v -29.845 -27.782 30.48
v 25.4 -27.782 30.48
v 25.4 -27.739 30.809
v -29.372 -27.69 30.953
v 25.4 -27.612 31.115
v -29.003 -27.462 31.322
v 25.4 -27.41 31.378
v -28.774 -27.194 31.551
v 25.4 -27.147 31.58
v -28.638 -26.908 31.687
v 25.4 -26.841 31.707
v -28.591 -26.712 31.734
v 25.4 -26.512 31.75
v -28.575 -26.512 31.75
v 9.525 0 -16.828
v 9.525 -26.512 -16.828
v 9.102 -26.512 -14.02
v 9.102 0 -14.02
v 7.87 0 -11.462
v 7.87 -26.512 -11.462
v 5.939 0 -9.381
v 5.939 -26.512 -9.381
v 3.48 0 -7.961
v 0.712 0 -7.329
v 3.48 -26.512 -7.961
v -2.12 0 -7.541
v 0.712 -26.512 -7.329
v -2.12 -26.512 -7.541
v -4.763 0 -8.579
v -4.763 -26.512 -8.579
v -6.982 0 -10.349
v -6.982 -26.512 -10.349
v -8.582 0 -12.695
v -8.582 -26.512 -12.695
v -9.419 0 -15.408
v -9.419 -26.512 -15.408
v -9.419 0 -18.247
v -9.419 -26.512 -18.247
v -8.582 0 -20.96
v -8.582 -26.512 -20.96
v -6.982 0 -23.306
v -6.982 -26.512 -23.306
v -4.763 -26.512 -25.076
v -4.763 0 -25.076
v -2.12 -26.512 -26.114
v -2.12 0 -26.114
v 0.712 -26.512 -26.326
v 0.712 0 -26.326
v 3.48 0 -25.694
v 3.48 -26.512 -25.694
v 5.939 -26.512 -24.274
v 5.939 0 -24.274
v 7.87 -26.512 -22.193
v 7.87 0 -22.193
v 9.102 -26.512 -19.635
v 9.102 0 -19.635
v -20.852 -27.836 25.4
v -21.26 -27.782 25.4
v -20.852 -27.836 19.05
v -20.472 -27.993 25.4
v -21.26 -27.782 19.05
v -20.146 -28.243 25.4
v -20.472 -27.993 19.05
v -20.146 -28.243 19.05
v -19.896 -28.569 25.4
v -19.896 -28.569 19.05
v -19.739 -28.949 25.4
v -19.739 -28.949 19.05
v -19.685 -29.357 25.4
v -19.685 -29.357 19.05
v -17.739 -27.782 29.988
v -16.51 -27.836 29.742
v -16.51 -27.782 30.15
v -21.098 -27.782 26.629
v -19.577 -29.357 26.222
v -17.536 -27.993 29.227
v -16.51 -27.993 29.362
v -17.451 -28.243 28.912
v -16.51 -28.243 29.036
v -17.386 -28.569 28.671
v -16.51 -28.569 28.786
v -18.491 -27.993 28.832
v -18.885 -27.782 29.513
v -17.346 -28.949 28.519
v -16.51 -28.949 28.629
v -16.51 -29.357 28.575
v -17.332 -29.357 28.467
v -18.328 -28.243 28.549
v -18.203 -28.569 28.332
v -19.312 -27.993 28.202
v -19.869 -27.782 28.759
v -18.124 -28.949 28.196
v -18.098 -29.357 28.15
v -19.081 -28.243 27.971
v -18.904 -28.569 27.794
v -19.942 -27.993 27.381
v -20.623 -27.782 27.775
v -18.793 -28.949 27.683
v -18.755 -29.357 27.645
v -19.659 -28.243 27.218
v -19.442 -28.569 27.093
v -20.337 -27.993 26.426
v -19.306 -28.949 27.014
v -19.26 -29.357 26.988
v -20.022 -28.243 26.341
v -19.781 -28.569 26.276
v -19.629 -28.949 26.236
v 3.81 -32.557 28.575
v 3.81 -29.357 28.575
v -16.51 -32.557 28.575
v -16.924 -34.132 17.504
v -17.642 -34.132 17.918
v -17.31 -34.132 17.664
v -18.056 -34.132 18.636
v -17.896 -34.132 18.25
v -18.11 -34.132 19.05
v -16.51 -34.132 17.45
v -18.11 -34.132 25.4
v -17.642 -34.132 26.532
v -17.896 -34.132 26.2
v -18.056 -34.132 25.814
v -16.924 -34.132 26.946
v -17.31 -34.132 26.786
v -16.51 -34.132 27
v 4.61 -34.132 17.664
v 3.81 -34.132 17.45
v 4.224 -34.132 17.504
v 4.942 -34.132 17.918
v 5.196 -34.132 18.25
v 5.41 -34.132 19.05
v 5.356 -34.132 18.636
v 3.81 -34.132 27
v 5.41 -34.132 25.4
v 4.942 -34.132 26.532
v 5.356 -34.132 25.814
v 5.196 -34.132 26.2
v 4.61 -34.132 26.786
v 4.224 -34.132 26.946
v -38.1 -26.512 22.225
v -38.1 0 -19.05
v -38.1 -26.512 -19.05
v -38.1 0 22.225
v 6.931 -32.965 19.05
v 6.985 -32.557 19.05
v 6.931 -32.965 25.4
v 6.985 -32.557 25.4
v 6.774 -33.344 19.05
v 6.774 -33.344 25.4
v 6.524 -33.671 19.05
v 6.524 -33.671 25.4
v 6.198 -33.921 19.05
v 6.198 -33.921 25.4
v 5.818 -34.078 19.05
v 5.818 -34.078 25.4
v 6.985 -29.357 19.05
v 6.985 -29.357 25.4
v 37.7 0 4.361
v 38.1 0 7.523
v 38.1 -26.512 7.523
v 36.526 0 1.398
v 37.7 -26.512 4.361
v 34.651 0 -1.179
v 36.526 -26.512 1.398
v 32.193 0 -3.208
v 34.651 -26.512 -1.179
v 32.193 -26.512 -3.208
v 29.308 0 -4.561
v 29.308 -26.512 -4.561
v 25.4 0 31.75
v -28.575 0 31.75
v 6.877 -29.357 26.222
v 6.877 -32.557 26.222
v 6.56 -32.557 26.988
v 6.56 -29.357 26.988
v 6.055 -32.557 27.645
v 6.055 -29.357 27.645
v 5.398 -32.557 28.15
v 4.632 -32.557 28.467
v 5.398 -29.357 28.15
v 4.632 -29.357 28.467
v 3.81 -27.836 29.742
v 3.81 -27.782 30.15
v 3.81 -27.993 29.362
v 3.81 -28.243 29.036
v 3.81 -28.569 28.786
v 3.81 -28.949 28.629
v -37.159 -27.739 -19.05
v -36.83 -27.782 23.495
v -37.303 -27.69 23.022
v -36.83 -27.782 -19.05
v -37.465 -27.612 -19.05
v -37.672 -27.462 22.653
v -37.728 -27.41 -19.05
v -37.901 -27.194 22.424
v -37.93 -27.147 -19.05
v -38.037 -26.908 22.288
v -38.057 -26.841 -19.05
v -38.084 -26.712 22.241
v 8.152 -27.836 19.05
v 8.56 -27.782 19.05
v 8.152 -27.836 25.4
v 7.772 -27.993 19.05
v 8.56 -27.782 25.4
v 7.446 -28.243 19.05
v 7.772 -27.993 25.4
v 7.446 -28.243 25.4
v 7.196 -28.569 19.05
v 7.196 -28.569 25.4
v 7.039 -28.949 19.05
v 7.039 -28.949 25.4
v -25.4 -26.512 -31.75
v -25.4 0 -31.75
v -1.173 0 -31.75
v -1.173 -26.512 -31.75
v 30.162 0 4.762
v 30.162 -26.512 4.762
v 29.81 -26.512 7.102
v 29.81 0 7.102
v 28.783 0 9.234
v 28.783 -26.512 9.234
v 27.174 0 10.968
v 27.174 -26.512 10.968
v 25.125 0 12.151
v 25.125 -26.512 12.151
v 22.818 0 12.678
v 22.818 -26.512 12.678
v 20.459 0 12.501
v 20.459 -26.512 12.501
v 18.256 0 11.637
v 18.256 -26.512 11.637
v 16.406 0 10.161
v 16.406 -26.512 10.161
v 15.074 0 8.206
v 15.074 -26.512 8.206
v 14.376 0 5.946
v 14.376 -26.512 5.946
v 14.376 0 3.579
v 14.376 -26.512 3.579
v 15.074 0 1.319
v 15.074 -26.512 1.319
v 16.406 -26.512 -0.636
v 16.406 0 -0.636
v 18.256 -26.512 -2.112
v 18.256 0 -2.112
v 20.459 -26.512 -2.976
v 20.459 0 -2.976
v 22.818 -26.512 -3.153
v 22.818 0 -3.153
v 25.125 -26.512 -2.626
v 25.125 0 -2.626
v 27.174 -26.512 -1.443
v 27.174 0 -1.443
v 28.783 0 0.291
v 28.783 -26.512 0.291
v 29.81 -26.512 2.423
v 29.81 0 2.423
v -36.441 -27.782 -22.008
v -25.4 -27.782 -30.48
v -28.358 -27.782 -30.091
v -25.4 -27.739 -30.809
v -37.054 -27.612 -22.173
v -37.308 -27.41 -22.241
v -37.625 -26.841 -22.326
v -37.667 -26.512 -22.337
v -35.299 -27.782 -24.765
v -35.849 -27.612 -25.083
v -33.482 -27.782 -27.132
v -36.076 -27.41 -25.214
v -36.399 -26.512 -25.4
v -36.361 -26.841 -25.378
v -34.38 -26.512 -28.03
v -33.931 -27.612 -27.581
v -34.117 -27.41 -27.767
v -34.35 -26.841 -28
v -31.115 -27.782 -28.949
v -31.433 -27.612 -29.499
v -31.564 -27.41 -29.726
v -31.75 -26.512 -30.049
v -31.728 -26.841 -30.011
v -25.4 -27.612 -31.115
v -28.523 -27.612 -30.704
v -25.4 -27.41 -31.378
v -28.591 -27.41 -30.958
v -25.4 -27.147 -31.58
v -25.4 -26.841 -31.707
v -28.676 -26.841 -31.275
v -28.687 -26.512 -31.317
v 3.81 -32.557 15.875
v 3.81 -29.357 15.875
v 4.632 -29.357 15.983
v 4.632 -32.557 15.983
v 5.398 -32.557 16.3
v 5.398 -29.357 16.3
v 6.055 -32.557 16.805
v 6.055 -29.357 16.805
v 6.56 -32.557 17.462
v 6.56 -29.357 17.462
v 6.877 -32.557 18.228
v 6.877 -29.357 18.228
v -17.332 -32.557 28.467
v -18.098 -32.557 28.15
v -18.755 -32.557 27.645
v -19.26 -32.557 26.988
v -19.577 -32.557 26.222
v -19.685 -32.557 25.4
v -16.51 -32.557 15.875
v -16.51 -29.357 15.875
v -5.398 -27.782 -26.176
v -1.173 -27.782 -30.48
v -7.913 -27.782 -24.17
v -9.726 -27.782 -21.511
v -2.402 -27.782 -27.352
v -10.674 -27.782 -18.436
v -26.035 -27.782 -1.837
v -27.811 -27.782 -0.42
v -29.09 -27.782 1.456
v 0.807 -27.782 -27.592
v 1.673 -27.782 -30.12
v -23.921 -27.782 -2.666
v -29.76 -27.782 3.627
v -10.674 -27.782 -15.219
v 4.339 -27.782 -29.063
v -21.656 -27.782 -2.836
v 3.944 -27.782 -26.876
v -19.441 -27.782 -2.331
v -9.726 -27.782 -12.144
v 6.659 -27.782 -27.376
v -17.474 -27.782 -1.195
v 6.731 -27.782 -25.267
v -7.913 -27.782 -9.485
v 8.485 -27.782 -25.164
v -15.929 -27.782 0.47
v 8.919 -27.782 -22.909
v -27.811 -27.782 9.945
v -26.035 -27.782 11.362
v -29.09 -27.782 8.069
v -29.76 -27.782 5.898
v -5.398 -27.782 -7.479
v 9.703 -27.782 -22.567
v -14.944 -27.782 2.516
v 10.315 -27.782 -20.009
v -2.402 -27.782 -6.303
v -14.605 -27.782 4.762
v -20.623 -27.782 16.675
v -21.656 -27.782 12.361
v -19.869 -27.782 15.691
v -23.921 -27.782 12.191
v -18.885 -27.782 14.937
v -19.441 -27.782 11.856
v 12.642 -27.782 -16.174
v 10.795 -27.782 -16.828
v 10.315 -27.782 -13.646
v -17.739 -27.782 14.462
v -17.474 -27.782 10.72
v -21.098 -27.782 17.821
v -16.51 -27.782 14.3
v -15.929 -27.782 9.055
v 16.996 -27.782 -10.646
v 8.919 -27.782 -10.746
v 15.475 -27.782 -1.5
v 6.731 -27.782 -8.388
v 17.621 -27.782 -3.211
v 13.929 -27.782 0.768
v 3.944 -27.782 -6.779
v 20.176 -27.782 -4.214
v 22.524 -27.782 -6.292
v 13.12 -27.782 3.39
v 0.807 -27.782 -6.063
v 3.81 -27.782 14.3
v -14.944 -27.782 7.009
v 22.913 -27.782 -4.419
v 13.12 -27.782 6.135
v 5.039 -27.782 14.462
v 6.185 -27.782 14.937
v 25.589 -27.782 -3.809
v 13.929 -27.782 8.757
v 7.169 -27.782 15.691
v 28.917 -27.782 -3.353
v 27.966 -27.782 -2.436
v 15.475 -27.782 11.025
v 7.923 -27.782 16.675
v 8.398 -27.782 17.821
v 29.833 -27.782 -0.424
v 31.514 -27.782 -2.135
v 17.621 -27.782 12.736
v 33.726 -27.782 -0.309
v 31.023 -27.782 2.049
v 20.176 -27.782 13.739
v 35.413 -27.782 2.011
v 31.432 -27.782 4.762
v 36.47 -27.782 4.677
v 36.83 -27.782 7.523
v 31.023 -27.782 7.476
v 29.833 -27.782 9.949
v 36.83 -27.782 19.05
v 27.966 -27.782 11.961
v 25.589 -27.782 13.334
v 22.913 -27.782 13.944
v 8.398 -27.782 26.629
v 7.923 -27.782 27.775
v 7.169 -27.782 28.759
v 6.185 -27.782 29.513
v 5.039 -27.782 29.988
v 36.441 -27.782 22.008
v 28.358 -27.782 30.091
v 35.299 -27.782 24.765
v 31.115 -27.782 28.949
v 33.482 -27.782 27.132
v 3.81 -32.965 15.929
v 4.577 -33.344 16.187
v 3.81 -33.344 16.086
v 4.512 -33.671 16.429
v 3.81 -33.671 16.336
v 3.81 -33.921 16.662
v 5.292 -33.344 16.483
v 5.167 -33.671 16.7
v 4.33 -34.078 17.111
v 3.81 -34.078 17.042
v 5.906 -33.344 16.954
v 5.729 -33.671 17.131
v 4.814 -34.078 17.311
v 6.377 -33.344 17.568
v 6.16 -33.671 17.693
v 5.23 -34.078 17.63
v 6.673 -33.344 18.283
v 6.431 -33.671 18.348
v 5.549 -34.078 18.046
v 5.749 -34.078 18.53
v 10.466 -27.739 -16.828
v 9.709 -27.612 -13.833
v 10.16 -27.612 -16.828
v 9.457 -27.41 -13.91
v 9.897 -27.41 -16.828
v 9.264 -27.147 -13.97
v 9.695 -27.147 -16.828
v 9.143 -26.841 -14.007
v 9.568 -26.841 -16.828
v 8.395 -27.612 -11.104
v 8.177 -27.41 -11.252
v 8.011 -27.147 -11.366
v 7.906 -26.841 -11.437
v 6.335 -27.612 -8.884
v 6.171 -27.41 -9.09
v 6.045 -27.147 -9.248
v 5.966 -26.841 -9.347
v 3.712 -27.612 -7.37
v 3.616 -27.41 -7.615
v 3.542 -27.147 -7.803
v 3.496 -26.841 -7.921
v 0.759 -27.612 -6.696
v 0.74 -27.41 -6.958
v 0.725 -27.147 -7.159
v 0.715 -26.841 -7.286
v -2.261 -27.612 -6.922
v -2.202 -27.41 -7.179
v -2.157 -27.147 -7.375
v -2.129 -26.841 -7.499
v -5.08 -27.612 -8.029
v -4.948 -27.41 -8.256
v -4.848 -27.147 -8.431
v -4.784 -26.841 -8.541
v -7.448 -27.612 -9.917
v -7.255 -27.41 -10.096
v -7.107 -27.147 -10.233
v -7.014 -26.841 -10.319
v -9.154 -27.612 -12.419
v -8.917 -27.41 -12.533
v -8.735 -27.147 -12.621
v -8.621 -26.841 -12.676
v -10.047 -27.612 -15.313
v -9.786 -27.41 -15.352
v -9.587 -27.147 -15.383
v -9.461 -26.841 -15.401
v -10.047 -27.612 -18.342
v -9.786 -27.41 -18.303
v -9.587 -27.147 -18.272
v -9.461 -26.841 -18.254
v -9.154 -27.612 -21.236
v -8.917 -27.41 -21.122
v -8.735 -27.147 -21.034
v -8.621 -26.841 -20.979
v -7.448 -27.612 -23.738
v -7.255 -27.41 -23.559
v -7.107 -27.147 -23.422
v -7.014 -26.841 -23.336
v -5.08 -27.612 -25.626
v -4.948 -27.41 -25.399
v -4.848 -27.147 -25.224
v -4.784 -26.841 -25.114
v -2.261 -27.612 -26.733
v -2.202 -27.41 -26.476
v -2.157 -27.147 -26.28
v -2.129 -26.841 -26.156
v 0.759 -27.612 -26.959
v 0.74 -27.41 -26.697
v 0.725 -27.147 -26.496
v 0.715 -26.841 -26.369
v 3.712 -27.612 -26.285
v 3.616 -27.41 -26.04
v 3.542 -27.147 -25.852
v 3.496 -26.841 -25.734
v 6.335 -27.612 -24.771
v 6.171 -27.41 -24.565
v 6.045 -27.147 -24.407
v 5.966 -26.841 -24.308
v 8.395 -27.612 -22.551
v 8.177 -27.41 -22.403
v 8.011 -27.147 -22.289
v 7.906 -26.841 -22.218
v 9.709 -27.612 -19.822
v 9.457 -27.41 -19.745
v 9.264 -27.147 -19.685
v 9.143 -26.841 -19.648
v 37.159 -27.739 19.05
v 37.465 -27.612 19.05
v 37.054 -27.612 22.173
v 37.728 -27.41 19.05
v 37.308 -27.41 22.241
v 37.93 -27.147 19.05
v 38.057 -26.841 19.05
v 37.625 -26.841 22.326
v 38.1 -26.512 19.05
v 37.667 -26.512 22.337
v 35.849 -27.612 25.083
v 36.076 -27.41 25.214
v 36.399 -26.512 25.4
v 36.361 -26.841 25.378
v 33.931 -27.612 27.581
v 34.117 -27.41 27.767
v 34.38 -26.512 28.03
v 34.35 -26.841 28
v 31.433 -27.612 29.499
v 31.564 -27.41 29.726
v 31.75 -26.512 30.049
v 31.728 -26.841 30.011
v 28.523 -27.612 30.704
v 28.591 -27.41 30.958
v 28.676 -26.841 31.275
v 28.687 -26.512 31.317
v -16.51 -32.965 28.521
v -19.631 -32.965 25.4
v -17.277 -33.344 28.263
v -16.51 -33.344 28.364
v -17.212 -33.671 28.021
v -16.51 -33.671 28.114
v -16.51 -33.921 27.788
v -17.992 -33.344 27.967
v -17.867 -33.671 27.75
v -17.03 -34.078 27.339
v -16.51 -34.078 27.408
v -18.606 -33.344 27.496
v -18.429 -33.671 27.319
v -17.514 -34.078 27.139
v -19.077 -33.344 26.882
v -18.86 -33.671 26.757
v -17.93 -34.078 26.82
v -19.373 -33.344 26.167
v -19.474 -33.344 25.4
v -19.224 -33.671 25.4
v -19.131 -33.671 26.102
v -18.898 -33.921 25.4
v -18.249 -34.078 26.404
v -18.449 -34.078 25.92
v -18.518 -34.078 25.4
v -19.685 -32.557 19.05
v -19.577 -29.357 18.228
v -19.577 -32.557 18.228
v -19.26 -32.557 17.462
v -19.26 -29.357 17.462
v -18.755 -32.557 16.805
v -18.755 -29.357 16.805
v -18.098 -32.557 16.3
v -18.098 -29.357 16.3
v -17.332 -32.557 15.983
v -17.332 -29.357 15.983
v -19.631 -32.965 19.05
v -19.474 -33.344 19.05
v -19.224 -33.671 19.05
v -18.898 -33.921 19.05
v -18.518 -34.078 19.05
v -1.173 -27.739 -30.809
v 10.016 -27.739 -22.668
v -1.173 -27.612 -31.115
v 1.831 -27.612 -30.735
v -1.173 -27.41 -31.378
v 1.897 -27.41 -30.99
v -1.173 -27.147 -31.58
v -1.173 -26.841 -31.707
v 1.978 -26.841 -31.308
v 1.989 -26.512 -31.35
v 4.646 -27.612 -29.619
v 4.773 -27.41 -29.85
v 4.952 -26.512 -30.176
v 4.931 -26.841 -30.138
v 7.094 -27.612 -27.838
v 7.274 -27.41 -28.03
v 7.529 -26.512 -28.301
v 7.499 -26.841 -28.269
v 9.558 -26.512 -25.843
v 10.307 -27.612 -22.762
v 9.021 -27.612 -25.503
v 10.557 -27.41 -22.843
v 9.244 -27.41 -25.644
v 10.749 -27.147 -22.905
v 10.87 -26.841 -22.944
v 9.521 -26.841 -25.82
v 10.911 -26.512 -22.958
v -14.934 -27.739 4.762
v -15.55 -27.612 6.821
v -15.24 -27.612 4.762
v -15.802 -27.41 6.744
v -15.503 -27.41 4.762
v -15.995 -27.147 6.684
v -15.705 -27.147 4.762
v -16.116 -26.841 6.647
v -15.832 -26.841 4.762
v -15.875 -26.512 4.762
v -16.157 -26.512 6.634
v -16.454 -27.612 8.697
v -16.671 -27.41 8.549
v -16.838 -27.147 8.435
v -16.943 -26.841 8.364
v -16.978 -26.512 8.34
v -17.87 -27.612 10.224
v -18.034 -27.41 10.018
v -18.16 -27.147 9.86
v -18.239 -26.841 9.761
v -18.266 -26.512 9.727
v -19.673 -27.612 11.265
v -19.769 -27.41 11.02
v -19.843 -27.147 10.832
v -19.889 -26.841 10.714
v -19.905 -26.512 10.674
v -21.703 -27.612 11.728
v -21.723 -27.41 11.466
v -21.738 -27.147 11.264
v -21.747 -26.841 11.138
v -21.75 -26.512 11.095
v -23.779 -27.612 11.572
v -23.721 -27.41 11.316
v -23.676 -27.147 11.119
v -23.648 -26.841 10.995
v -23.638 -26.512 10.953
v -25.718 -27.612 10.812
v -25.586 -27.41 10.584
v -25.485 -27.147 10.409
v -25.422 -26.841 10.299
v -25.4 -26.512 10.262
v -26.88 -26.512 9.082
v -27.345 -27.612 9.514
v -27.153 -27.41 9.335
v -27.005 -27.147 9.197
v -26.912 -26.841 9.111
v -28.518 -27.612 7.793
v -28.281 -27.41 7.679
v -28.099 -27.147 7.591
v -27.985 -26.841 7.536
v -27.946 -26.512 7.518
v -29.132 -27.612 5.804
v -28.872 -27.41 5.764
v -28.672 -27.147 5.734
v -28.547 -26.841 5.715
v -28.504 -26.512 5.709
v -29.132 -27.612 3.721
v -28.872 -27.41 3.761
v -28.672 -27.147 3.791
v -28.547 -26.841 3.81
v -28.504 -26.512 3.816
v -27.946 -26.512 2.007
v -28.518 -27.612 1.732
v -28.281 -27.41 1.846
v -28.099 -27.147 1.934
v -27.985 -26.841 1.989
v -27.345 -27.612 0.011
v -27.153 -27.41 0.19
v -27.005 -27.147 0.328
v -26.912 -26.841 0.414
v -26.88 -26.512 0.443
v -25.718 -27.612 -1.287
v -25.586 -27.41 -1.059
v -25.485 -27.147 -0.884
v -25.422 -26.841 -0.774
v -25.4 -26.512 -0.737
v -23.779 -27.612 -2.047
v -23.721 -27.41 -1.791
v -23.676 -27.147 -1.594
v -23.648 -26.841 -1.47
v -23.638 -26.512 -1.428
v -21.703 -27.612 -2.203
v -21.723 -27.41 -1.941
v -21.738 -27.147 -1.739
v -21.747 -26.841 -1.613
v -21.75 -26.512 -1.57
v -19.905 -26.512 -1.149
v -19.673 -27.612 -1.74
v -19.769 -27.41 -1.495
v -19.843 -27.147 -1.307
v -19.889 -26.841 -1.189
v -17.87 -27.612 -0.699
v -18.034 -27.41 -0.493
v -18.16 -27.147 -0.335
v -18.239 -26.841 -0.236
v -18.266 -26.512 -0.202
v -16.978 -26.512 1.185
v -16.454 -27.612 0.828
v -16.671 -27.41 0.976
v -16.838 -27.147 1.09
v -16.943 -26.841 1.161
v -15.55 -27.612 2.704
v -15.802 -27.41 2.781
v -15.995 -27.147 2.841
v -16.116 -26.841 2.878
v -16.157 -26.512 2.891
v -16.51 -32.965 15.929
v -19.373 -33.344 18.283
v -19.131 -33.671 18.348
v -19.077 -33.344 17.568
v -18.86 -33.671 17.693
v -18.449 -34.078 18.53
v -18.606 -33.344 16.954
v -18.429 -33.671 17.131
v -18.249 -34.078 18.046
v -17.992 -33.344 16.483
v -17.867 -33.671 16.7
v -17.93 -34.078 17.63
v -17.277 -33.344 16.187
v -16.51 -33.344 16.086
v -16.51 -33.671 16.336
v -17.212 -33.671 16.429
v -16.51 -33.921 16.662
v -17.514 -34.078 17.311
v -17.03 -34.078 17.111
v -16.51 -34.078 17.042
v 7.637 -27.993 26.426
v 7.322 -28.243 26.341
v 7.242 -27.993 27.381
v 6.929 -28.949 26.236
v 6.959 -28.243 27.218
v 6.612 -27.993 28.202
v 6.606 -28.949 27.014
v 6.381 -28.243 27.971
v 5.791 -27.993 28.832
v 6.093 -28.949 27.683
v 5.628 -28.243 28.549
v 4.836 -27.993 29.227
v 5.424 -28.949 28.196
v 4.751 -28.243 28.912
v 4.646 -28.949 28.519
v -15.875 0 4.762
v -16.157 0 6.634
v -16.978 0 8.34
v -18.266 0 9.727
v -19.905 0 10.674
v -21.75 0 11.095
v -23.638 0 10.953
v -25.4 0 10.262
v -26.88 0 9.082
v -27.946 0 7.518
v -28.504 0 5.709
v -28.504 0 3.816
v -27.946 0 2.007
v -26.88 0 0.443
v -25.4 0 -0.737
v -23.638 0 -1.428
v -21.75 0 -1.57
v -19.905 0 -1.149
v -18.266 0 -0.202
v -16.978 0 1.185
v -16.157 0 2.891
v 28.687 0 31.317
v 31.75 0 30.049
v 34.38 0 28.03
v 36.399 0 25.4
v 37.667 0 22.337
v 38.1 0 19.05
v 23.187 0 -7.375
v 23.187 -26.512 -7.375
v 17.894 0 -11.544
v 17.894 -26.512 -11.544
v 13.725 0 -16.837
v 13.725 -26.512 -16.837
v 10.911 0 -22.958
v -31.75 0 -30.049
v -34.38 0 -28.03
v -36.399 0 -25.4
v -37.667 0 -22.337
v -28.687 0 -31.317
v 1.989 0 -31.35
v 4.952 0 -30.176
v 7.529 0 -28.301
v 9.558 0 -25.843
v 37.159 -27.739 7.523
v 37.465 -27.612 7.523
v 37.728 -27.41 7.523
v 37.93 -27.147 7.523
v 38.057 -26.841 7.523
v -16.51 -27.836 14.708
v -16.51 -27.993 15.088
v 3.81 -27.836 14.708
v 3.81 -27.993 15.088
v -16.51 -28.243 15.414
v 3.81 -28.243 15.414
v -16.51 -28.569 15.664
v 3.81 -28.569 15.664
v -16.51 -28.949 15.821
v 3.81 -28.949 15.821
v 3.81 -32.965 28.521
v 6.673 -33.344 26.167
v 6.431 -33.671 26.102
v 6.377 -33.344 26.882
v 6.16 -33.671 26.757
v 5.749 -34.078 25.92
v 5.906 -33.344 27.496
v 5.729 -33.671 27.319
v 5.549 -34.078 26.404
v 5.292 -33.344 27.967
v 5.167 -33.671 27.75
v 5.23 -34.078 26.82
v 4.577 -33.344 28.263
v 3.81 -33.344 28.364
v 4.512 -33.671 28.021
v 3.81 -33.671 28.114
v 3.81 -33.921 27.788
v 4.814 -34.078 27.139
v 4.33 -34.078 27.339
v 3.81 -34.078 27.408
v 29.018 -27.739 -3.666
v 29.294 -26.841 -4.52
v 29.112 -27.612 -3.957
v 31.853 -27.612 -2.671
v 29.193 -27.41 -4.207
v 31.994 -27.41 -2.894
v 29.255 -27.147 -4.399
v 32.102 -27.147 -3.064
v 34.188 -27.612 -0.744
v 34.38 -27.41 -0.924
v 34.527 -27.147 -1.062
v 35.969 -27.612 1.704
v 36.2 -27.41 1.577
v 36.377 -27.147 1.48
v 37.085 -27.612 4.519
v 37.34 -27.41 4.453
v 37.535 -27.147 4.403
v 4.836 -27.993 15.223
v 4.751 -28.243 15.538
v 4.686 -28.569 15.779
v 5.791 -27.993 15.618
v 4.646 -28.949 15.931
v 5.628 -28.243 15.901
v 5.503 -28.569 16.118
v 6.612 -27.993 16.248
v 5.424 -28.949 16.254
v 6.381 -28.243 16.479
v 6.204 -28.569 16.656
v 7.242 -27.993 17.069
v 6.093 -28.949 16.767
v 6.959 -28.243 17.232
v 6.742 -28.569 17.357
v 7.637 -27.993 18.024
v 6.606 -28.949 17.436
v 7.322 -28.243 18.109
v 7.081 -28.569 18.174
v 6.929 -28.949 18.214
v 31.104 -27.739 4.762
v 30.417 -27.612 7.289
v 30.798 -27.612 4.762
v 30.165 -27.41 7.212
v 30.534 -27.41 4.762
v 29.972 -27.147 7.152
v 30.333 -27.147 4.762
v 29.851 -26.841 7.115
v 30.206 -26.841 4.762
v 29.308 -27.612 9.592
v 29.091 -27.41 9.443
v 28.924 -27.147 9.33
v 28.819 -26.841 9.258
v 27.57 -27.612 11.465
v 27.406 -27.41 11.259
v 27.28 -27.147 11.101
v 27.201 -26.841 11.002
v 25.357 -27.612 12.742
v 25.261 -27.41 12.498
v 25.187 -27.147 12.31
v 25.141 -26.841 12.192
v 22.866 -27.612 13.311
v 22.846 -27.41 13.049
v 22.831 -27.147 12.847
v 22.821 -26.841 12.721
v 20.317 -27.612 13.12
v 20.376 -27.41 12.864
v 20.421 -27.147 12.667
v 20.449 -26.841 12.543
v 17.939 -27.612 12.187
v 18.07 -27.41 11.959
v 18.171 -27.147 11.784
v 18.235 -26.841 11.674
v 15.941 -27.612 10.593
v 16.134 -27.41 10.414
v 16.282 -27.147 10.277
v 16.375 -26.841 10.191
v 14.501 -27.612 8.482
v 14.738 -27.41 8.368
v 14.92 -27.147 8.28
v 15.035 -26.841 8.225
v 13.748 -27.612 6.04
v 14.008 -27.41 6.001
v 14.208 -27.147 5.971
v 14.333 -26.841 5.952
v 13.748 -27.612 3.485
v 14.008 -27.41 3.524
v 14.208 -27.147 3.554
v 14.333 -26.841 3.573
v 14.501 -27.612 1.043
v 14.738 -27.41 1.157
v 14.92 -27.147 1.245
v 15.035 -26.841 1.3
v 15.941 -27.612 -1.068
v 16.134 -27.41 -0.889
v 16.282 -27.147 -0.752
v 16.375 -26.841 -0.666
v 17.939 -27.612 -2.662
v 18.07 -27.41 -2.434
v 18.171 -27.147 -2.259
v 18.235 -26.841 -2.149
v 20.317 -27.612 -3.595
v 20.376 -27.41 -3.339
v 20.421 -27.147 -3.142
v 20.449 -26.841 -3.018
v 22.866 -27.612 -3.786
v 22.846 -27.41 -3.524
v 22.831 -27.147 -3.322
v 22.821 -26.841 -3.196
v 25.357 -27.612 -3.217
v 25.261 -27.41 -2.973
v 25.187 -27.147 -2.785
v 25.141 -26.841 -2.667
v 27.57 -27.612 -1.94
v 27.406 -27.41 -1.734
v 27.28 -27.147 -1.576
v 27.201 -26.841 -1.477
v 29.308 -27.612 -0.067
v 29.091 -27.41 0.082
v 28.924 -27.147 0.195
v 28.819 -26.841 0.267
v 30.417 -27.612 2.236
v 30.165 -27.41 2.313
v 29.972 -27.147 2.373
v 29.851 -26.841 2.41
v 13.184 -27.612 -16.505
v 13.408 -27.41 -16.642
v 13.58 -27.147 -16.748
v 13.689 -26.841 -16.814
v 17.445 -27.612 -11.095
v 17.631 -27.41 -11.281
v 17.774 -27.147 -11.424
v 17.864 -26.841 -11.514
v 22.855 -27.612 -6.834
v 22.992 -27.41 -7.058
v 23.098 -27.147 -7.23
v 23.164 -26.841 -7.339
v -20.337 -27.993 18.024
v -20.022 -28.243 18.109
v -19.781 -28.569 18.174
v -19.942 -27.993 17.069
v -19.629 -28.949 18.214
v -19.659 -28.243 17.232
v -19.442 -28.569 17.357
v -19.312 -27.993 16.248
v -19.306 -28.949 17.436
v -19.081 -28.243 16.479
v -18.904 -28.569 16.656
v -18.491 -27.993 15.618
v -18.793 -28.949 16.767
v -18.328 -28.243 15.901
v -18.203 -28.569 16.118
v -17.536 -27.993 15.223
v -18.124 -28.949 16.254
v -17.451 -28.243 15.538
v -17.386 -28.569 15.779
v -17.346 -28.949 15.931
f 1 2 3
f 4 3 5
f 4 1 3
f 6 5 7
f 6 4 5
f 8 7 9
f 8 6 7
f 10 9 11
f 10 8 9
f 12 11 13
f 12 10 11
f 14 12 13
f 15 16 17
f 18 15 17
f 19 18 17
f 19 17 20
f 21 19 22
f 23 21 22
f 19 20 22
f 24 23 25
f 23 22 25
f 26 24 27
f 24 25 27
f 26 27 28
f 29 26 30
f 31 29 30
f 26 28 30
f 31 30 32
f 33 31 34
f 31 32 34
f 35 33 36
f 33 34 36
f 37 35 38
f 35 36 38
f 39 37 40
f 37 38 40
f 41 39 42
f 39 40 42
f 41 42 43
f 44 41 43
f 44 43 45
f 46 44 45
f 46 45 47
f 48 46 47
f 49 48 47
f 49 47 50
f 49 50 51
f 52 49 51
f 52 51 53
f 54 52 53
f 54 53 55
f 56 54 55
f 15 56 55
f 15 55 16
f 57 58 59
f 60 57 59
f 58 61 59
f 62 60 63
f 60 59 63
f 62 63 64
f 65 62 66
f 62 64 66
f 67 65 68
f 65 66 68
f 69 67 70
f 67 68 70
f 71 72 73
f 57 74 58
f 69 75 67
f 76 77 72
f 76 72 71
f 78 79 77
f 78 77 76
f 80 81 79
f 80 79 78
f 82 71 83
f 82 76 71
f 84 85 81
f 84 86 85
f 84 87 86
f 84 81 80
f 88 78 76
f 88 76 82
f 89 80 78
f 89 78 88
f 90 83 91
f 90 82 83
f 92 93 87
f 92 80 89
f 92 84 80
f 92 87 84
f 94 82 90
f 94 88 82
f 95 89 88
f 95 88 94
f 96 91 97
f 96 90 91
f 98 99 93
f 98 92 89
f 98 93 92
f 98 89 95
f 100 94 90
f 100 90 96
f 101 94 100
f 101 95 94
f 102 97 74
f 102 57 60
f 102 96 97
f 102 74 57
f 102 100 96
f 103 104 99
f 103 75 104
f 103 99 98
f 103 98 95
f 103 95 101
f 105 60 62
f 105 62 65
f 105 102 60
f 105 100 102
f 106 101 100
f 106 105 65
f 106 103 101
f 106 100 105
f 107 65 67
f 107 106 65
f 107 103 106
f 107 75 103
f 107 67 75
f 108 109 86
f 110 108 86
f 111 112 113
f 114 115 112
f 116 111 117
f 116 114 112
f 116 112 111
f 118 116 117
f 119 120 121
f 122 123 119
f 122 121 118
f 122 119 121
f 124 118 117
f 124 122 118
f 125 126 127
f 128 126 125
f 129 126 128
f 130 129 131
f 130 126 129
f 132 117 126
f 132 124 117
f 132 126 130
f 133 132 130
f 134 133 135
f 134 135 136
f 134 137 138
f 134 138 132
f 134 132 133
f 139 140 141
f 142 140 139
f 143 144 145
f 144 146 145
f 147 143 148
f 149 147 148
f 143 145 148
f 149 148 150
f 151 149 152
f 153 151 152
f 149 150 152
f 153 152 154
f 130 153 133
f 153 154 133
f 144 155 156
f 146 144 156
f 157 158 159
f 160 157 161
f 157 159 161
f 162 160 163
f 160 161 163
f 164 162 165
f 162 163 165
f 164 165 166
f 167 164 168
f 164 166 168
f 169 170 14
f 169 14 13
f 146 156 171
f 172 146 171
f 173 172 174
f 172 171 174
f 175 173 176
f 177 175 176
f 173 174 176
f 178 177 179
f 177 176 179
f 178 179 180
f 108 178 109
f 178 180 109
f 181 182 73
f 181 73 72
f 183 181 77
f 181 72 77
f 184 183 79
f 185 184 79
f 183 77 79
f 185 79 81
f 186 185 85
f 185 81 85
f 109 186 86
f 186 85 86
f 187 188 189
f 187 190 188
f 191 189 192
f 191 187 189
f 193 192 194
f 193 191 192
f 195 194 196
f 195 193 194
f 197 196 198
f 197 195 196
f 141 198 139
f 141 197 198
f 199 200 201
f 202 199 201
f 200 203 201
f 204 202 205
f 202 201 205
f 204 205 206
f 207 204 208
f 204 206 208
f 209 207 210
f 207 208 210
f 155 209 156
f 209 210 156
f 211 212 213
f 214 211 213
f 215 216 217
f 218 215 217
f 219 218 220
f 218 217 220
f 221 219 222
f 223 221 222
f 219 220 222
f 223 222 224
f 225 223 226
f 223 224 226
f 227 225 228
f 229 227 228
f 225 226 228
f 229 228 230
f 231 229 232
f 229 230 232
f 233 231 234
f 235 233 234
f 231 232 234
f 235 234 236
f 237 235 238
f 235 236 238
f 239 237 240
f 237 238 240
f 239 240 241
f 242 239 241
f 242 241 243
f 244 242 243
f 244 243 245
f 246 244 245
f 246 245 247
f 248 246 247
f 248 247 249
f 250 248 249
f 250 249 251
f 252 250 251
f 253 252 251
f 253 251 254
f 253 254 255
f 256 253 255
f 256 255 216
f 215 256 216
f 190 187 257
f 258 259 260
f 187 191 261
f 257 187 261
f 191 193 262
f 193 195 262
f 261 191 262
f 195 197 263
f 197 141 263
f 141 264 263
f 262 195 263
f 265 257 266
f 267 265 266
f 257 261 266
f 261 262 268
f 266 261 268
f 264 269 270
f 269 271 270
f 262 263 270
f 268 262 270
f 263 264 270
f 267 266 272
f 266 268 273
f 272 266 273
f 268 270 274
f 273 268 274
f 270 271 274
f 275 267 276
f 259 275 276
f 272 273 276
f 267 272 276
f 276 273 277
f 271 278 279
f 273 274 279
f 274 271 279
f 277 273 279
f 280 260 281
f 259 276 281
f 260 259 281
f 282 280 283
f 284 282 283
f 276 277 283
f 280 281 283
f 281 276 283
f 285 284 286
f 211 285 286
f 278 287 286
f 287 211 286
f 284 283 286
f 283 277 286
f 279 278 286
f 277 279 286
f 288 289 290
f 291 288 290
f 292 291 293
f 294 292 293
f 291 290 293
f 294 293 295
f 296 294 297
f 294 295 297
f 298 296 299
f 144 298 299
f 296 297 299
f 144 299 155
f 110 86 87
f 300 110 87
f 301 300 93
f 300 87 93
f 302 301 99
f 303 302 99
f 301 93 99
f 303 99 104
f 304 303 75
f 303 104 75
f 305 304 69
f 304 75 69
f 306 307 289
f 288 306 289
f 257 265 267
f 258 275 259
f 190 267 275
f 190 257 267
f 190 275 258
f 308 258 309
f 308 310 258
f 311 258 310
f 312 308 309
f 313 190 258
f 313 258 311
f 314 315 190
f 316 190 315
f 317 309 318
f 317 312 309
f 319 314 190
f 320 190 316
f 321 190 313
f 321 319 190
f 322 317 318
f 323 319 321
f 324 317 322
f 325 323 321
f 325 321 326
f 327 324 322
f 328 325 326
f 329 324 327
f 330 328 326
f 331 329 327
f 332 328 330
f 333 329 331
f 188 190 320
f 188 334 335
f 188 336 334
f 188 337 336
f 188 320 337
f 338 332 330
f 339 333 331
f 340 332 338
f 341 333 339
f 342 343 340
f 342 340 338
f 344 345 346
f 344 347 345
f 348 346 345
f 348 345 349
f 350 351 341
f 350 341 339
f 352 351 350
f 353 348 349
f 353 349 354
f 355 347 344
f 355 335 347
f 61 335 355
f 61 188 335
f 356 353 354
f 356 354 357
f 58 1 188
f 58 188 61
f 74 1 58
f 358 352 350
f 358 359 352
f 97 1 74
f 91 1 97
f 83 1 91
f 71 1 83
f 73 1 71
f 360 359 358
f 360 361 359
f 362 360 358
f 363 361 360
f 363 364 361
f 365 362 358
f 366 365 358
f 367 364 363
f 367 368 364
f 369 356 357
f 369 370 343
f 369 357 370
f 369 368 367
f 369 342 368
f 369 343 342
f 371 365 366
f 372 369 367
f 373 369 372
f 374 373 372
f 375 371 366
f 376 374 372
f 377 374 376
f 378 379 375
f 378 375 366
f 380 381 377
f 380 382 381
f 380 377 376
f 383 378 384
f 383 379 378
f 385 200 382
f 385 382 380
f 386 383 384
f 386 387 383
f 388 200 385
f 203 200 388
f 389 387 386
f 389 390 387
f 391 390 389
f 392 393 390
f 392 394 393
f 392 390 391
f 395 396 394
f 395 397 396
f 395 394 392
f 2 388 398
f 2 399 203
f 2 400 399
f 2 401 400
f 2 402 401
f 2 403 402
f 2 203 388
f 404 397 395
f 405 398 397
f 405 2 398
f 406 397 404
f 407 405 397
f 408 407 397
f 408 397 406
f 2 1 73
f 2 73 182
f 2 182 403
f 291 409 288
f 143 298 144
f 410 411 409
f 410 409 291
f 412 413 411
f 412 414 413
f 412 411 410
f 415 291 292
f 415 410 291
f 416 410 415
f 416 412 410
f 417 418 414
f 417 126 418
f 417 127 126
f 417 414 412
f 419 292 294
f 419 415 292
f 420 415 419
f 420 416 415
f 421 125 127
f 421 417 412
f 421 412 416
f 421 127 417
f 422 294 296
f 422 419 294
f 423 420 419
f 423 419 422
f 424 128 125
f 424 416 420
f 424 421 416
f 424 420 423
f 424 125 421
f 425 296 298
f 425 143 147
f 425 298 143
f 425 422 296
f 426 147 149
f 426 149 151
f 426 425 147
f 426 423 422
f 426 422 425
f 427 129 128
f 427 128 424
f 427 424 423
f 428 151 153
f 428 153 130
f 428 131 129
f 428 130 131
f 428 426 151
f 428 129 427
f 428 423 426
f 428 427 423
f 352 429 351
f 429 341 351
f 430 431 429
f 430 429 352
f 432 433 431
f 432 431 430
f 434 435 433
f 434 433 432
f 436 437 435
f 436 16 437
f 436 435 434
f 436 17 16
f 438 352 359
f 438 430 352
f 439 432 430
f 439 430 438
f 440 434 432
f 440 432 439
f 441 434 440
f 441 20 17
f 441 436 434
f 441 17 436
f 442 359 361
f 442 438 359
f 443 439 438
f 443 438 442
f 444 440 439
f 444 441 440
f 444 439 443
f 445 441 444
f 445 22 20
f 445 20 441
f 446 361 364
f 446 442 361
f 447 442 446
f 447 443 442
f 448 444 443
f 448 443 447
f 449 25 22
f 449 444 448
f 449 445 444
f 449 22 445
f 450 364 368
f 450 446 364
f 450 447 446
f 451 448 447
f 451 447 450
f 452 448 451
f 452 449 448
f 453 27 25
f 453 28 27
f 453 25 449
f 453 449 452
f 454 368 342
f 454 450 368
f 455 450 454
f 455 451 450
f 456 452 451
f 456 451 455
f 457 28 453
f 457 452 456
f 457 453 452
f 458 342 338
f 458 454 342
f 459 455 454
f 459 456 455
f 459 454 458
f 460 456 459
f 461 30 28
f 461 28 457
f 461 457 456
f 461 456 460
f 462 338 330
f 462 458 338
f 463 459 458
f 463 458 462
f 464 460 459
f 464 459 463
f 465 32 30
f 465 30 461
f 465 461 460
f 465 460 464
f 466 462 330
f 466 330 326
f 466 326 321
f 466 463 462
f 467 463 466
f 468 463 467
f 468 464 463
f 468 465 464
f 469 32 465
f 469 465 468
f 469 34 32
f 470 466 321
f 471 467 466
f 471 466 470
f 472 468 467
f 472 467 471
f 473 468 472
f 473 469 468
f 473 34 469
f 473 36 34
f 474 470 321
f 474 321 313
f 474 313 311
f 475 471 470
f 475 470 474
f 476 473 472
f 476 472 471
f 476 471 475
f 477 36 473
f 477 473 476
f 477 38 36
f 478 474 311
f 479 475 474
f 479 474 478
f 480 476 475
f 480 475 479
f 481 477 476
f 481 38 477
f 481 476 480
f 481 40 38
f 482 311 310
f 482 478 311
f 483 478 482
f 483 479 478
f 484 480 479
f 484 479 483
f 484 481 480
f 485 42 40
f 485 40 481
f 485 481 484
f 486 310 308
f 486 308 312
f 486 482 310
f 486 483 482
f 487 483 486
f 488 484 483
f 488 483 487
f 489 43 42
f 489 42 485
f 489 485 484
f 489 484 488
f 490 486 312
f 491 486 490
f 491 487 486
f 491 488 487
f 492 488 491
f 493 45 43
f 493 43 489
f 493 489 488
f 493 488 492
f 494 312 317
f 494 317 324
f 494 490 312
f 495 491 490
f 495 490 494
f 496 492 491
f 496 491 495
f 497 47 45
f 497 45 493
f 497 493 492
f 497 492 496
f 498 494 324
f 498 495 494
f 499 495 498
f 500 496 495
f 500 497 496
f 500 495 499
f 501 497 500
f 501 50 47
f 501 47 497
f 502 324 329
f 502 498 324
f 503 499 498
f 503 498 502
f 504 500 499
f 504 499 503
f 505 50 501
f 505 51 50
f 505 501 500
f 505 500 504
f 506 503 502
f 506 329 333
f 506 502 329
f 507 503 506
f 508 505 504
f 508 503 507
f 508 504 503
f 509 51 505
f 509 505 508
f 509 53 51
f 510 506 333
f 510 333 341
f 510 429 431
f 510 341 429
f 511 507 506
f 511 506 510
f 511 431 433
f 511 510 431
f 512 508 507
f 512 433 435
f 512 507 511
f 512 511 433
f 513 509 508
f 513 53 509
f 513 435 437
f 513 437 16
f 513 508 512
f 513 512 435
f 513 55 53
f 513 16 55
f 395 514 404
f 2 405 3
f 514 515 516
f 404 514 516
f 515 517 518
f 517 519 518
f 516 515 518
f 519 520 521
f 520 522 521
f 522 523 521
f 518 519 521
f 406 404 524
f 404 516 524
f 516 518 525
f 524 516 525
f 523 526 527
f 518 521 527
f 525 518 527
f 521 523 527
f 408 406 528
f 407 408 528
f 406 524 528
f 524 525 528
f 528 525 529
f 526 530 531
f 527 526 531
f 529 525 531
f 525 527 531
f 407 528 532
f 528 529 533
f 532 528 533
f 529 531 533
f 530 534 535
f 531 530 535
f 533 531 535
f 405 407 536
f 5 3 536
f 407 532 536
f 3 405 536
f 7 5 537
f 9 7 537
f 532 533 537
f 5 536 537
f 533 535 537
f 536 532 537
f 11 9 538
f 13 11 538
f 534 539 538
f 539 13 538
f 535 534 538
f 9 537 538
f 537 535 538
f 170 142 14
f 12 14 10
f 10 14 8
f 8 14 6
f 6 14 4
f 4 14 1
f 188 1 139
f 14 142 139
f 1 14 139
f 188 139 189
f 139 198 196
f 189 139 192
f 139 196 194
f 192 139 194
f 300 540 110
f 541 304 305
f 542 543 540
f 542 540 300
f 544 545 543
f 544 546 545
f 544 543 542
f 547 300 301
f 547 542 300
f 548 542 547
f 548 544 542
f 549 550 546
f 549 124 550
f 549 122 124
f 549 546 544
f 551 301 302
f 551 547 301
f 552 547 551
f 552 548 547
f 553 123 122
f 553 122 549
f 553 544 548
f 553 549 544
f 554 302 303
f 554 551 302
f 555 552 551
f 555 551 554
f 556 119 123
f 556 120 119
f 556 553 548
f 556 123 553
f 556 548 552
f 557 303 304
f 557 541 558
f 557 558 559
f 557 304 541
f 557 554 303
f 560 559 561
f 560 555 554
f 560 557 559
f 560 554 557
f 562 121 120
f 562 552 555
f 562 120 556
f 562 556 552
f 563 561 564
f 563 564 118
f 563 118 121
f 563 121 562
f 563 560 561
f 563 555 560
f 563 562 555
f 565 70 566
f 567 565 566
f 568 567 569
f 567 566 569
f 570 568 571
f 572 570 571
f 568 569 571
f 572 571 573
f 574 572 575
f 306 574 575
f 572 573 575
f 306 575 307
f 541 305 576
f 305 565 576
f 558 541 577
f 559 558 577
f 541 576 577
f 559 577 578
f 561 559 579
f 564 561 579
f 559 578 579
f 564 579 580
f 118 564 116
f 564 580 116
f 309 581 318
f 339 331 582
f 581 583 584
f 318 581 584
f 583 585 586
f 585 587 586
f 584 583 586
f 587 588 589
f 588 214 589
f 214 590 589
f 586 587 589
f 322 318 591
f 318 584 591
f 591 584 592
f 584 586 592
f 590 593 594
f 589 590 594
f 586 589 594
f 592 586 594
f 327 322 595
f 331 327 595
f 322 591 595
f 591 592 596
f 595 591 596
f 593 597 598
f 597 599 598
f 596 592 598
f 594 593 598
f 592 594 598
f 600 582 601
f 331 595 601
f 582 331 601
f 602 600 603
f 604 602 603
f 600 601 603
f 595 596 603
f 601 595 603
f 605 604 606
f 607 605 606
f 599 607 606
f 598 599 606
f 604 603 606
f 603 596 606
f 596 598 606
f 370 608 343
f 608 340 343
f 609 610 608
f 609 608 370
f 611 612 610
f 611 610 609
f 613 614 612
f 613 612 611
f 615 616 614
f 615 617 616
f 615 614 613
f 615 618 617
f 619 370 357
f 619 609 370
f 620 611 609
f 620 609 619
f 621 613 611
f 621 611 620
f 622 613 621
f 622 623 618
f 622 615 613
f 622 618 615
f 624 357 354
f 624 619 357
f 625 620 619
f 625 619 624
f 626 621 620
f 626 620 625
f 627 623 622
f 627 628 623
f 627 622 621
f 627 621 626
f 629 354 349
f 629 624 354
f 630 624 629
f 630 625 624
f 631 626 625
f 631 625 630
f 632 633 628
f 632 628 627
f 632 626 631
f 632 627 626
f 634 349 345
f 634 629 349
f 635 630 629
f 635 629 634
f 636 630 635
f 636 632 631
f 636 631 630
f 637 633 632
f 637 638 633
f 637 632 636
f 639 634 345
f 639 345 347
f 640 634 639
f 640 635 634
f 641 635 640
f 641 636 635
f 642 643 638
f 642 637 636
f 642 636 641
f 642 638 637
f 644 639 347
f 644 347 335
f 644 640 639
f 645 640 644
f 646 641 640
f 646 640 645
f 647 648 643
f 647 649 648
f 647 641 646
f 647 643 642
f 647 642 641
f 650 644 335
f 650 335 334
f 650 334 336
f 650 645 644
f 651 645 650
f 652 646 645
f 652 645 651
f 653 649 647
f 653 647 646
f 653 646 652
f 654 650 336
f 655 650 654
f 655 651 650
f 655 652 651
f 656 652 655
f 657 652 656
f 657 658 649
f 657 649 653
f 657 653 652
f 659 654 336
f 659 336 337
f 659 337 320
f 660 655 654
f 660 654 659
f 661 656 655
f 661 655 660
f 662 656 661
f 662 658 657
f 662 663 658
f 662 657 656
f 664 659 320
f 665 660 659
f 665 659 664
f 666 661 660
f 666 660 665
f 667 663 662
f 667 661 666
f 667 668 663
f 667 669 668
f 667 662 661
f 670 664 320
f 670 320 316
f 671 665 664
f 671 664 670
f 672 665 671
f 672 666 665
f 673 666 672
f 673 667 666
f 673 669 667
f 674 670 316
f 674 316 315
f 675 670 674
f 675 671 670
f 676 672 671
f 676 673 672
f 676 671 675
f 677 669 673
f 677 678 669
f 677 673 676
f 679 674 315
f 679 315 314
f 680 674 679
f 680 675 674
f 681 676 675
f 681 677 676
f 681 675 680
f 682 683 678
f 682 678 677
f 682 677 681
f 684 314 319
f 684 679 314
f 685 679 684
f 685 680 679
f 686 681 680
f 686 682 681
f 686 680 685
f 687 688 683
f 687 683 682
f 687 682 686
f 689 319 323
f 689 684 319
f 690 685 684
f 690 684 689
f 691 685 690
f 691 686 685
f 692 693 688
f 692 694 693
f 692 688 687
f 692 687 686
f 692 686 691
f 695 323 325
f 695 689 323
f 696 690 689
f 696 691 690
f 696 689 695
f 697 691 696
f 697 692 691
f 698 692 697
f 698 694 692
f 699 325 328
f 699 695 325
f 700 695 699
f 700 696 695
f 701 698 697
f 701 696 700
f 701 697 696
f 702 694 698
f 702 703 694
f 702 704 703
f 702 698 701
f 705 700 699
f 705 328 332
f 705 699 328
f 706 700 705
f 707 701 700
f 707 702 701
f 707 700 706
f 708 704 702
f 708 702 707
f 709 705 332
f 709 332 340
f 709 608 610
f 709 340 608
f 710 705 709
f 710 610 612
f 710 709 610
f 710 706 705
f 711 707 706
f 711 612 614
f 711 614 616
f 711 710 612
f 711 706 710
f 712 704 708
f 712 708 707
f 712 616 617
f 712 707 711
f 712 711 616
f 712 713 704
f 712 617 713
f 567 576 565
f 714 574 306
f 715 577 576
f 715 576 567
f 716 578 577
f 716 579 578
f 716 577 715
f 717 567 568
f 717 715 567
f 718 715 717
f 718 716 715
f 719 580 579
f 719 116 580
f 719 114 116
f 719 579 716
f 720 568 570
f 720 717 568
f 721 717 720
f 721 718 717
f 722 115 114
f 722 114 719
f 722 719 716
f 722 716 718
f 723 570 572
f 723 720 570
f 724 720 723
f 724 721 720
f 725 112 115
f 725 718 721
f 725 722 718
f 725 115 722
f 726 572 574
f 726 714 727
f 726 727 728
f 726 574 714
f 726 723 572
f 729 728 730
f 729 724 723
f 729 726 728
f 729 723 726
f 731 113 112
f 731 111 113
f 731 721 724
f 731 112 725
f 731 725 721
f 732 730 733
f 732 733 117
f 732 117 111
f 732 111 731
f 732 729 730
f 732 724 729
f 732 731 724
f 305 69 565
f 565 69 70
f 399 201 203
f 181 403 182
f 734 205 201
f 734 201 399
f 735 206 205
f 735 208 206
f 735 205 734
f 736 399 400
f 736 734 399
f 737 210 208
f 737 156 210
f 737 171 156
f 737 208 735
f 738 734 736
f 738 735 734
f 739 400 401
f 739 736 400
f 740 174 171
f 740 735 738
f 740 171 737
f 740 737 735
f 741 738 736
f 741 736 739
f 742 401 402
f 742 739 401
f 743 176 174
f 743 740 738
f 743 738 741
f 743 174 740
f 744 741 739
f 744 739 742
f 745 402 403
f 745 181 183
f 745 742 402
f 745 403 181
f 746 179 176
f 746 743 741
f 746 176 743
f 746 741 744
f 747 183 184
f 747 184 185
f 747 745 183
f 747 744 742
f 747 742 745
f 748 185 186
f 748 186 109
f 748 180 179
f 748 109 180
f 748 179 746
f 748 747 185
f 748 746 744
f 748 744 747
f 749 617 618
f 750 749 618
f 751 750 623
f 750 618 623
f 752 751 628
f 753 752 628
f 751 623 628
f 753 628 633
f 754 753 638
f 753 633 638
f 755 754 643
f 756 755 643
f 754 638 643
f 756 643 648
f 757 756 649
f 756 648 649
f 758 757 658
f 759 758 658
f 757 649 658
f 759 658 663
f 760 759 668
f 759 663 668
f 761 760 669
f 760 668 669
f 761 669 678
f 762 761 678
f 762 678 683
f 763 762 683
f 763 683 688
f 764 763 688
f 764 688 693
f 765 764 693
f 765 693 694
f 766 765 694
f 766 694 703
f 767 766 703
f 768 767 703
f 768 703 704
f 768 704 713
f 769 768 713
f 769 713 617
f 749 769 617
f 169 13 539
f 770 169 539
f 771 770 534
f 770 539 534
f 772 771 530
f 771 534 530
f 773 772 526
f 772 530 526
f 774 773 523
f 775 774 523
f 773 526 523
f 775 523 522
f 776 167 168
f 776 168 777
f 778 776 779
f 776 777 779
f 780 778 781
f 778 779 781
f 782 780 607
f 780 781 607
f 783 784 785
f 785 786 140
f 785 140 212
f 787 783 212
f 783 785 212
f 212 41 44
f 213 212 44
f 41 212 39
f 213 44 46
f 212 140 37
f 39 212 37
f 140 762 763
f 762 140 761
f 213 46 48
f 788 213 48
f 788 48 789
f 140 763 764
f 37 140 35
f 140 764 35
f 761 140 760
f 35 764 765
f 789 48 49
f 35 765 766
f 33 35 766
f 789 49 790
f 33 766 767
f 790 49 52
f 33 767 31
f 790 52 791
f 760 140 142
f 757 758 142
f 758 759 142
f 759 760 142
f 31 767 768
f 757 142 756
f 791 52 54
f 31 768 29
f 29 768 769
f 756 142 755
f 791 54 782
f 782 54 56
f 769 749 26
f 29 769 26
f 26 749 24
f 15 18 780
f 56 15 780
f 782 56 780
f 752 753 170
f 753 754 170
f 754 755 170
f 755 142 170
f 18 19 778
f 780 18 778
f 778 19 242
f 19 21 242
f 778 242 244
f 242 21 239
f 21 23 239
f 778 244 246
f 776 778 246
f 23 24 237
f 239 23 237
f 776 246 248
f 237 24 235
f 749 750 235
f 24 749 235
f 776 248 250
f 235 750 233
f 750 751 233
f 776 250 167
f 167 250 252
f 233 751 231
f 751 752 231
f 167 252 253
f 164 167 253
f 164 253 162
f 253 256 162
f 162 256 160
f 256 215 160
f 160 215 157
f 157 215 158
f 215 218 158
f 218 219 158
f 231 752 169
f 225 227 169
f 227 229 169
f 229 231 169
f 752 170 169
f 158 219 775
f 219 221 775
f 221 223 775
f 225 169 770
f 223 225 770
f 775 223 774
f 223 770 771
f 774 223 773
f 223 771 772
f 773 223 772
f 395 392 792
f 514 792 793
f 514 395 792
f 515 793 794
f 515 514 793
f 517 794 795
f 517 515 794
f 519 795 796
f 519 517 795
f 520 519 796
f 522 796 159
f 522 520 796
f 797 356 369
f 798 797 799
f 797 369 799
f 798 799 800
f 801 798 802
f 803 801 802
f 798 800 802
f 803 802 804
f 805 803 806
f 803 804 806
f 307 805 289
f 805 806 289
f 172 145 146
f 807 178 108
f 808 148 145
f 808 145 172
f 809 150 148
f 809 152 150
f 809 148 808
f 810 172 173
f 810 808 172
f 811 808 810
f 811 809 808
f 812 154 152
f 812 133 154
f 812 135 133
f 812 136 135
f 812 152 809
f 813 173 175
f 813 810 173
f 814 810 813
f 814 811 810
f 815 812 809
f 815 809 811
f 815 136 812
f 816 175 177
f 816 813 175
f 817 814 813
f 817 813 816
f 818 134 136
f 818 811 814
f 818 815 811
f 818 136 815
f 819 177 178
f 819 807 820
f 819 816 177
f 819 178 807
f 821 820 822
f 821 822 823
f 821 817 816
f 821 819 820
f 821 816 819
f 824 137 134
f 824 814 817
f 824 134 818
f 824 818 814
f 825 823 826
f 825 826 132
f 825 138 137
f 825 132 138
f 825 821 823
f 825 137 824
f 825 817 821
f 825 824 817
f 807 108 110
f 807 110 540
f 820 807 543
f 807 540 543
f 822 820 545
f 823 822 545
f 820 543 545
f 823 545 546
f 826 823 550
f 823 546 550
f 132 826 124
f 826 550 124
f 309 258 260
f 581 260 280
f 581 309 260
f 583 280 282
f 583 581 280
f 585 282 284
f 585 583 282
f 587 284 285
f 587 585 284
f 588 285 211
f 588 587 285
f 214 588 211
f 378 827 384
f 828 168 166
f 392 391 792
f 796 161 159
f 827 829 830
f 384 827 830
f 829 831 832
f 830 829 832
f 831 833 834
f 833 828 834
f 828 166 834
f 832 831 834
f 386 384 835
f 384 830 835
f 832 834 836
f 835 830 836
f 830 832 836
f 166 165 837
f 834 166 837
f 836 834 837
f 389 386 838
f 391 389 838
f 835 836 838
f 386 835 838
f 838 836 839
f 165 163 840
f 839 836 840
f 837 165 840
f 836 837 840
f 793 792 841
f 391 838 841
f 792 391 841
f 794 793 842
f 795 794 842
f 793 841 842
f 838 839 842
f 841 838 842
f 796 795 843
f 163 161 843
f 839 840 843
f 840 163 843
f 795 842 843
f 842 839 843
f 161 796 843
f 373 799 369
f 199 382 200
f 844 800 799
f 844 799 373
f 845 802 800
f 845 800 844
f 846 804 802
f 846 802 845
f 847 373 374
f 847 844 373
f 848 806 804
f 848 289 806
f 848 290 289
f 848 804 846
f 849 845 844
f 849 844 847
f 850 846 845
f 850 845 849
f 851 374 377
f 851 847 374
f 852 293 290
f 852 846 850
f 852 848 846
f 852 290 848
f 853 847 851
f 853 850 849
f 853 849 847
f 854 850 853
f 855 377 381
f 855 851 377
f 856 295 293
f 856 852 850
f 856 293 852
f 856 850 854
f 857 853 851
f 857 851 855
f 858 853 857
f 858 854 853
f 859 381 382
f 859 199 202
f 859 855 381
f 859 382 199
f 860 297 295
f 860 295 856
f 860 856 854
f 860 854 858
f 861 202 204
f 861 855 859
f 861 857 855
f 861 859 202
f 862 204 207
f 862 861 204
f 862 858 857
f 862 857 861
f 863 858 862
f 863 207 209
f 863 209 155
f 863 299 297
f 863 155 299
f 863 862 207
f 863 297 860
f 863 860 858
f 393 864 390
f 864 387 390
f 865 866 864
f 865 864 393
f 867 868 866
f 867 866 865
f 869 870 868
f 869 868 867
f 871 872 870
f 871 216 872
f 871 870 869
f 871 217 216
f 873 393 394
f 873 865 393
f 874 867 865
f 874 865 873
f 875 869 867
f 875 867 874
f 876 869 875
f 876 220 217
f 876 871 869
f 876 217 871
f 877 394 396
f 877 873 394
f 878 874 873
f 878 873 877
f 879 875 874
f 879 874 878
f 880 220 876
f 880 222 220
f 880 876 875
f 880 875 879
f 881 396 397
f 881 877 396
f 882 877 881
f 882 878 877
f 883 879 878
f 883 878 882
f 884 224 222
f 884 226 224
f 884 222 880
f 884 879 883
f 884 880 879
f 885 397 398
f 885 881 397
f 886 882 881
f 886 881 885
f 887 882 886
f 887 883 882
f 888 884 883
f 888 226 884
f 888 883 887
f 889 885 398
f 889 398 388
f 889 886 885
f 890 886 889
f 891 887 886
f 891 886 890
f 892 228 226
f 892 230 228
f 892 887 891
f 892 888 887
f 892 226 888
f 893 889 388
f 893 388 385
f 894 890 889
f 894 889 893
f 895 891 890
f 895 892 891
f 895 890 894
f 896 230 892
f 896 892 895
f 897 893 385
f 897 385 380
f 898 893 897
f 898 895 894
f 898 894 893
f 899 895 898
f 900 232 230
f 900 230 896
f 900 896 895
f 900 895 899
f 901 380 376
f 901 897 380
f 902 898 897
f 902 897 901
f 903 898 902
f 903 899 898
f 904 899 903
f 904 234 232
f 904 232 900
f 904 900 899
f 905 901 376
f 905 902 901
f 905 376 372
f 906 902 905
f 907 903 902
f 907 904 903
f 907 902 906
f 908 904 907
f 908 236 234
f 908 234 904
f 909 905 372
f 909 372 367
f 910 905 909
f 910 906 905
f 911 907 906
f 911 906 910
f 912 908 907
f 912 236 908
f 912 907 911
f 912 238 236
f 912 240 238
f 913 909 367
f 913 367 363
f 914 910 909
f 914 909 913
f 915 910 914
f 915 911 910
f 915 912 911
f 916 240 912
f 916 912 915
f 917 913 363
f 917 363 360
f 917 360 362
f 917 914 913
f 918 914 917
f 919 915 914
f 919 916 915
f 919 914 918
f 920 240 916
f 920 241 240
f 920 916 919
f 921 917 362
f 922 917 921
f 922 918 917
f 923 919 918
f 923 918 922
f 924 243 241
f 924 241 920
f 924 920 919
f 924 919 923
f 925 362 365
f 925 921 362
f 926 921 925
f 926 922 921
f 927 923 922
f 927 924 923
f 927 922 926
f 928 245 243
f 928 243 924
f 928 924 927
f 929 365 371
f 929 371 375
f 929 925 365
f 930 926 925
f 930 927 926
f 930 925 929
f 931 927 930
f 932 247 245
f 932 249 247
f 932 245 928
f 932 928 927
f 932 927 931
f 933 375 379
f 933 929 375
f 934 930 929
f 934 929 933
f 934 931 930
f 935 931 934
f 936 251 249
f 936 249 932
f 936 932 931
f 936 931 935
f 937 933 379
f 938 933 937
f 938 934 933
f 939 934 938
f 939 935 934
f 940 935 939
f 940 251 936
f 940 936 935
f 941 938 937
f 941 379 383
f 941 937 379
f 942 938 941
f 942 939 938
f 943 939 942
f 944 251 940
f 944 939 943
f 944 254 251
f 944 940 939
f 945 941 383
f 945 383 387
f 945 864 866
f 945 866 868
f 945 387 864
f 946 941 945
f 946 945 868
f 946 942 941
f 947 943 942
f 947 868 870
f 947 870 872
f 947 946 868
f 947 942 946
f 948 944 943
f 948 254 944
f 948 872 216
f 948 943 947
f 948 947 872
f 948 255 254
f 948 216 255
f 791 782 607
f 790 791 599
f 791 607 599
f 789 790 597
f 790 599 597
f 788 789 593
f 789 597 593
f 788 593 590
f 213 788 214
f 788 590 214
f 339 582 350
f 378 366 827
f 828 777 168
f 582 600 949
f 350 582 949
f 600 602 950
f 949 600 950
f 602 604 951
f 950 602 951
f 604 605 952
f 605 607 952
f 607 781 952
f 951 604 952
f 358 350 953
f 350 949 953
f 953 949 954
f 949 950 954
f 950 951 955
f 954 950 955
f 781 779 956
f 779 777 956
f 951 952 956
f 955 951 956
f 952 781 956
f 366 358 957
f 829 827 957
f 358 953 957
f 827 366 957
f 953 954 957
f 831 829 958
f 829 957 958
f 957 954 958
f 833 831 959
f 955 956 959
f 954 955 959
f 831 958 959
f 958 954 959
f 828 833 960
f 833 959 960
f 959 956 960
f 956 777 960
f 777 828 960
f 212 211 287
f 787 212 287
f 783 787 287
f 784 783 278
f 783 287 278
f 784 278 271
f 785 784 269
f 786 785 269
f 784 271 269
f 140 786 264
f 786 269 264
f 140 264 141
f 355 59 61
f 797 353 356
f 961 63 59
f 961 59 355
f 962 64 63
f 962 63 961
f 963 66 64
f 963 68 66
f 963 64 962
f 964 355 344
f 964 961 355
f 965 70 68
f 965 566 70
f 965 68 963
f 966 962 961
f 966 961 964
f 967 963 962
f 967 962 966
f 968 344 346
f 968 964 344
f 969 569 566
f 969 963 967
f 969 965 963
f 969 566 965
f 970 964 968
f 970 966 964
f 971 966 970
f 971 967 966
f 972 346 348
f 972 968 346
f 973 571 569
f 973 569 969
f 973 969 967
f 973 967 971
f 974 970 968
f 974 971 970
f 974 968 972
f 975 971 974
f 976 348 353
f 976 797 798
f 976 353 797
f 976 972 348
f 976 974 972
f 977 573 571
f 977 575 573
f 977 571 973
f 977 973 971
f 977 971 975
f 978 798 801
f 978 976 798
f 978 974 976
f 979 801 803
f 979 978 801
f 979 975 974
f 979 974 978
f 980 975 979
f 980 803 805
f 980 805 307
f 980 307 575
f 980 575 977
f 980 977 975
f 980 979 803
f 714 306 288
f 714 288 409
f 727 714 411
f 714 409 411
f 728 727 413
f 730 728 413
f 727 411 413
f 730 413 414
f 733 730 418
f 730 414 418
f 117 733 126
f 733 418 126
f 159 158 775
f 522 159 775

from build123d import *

# Parameters (mm, degrees)
F0_W      = 76.2
F0_H      = 63.5
F1_DEPTH  = 27.7818869799
F2_R      = 6.35
F2_R_2    = 9.525
F2_R_3    = 7.9375
F3_DEPTH  = 27.7828869799
F4_R      = 12.7
F5_SIZE   = 9.525
F6_R      = 28.575
F7_DEPTH  = 27.7828869799
F8_R      = 12.7
F10_DEPTH = 6.35
F11_R     = 1.5748
F12_R     = 1.27


with BuildPart() as f1:
    # F0 (on Front) → F1 (new body)
    with BuildSketch(Plane.XZ):
        Rectangle(F0_W, F0_H)
    extrude(amount=F1_DEPTH)

    # F2 (on face) → F3 (cut, through all)
    with BuildSketch(Plane.XZ.offset(27.7818869799)):
        with Locations((-22.225, 4.7625)):
            Circle(F2_R)
        with Locations((0, -16.8275)):
            Circle(F2_R_2)
        with Locations((22.225, 4.7625)):
            Circle(F2_R_3)
    extrude(amount=-F3_DEPTH, mode=Mode.SUBTRACT)

    # F4
    f4_edges = [f1.edges().sort_by_distance(p)[0] for p in [
        (38.1, -13.890943, 31.75),
    ]]
    fillet(f4_edges, radius=F4_R)

    # F5
    f5_edges = [f1.edges().sort_by_distance(p)[0] for p in [
        (-38.1, -13.890943, 31.75),
    ]]
    chamfer(f5_edges, length=F5_SIZE)

    # F6 (on face) → F7 (cut, through all)
    with BuildSketch(Plane.XZ.offset(27.7818869799)):
        with Locations((38.1, -31.75)):
            Circle(F6_R)
    extrude(amount=-F7_DEPTH, mode=Mode.SUBTRACT)

    # F8
    f8_edges = [f1.edges().sort_by_distance(p)[0] for p in [
        (-38.1, -13.890943, -31.75),
        (9.525, -13.890943, -31.75),
        (38.1, -13.890943, -3.175),
    ]]
    fillet(f8_edges, radius=F8_R)

    # F9 (on face) → F10 (join)
    with BuildSketch(Plane.XZ.offset(27.7818869799)):
        with BuildLine():
            ThreePointArc((-19.685, 19.05), (-18.7550640303, 16.8049359697), (-16.51, 15.875))
            Line((-16.51, 15.875), (3.81, 15.875))
            ThreePointArc((3.81, 15.875), (6.0550640303, 16.8049359697), (6.985, 19.05))
            Line((6.985, 19.05), (6.985, 25.4))
            ThreePointArc((6.985, 25.4), (6.0550640303, 27.6450640303), (3.81, 28.575))
            Line((3.81, 28.575), (-16.51, 28.575))
            ThreePointArc((-16.51, 28.575), (-18.7550640303, 27.6450640303), (-19.685, 25.4))
            Line((-19.685, 25.4), (-19.685, 19.05))
        make_face()
    extrude(amount=F10_DEPTH)

    # F11
    f11_edges = [f1.edges().sort_by_distance(p)[0] for p in [
        (-18.755064, -34.131887, 16.804936),
        (-6.35, -34.131887, 15.875),
        (6.055064, -34.131887, 16.804936),
        (6.985, -34.131887, 22.225),
        (6.055064, -34.131887, 27.645064),
        (-6.35, -34.131887, 28.575),
        (-18.755064, -34.131887, 27.645064),
        (-19.685, -34.131887, 22.225),
        (-6.35, -27.781887, 28.575),
    ]]
    fillet(f11_edges, radius=F11_R)

    # F12
    f12_edges = [f1.edges().sort_by_distance(p)[0] for p in [
        (-28.575, -27.781887, 4.7625),
        (-9.525, -27.781887, -16.8275),
        (14.2875, -27.781887, 4.7625),
        (-13.286291, -27.781887, -31.75),
    ]]
    fillet(f12_edges, radius=F12_R)


solid = f1.part
